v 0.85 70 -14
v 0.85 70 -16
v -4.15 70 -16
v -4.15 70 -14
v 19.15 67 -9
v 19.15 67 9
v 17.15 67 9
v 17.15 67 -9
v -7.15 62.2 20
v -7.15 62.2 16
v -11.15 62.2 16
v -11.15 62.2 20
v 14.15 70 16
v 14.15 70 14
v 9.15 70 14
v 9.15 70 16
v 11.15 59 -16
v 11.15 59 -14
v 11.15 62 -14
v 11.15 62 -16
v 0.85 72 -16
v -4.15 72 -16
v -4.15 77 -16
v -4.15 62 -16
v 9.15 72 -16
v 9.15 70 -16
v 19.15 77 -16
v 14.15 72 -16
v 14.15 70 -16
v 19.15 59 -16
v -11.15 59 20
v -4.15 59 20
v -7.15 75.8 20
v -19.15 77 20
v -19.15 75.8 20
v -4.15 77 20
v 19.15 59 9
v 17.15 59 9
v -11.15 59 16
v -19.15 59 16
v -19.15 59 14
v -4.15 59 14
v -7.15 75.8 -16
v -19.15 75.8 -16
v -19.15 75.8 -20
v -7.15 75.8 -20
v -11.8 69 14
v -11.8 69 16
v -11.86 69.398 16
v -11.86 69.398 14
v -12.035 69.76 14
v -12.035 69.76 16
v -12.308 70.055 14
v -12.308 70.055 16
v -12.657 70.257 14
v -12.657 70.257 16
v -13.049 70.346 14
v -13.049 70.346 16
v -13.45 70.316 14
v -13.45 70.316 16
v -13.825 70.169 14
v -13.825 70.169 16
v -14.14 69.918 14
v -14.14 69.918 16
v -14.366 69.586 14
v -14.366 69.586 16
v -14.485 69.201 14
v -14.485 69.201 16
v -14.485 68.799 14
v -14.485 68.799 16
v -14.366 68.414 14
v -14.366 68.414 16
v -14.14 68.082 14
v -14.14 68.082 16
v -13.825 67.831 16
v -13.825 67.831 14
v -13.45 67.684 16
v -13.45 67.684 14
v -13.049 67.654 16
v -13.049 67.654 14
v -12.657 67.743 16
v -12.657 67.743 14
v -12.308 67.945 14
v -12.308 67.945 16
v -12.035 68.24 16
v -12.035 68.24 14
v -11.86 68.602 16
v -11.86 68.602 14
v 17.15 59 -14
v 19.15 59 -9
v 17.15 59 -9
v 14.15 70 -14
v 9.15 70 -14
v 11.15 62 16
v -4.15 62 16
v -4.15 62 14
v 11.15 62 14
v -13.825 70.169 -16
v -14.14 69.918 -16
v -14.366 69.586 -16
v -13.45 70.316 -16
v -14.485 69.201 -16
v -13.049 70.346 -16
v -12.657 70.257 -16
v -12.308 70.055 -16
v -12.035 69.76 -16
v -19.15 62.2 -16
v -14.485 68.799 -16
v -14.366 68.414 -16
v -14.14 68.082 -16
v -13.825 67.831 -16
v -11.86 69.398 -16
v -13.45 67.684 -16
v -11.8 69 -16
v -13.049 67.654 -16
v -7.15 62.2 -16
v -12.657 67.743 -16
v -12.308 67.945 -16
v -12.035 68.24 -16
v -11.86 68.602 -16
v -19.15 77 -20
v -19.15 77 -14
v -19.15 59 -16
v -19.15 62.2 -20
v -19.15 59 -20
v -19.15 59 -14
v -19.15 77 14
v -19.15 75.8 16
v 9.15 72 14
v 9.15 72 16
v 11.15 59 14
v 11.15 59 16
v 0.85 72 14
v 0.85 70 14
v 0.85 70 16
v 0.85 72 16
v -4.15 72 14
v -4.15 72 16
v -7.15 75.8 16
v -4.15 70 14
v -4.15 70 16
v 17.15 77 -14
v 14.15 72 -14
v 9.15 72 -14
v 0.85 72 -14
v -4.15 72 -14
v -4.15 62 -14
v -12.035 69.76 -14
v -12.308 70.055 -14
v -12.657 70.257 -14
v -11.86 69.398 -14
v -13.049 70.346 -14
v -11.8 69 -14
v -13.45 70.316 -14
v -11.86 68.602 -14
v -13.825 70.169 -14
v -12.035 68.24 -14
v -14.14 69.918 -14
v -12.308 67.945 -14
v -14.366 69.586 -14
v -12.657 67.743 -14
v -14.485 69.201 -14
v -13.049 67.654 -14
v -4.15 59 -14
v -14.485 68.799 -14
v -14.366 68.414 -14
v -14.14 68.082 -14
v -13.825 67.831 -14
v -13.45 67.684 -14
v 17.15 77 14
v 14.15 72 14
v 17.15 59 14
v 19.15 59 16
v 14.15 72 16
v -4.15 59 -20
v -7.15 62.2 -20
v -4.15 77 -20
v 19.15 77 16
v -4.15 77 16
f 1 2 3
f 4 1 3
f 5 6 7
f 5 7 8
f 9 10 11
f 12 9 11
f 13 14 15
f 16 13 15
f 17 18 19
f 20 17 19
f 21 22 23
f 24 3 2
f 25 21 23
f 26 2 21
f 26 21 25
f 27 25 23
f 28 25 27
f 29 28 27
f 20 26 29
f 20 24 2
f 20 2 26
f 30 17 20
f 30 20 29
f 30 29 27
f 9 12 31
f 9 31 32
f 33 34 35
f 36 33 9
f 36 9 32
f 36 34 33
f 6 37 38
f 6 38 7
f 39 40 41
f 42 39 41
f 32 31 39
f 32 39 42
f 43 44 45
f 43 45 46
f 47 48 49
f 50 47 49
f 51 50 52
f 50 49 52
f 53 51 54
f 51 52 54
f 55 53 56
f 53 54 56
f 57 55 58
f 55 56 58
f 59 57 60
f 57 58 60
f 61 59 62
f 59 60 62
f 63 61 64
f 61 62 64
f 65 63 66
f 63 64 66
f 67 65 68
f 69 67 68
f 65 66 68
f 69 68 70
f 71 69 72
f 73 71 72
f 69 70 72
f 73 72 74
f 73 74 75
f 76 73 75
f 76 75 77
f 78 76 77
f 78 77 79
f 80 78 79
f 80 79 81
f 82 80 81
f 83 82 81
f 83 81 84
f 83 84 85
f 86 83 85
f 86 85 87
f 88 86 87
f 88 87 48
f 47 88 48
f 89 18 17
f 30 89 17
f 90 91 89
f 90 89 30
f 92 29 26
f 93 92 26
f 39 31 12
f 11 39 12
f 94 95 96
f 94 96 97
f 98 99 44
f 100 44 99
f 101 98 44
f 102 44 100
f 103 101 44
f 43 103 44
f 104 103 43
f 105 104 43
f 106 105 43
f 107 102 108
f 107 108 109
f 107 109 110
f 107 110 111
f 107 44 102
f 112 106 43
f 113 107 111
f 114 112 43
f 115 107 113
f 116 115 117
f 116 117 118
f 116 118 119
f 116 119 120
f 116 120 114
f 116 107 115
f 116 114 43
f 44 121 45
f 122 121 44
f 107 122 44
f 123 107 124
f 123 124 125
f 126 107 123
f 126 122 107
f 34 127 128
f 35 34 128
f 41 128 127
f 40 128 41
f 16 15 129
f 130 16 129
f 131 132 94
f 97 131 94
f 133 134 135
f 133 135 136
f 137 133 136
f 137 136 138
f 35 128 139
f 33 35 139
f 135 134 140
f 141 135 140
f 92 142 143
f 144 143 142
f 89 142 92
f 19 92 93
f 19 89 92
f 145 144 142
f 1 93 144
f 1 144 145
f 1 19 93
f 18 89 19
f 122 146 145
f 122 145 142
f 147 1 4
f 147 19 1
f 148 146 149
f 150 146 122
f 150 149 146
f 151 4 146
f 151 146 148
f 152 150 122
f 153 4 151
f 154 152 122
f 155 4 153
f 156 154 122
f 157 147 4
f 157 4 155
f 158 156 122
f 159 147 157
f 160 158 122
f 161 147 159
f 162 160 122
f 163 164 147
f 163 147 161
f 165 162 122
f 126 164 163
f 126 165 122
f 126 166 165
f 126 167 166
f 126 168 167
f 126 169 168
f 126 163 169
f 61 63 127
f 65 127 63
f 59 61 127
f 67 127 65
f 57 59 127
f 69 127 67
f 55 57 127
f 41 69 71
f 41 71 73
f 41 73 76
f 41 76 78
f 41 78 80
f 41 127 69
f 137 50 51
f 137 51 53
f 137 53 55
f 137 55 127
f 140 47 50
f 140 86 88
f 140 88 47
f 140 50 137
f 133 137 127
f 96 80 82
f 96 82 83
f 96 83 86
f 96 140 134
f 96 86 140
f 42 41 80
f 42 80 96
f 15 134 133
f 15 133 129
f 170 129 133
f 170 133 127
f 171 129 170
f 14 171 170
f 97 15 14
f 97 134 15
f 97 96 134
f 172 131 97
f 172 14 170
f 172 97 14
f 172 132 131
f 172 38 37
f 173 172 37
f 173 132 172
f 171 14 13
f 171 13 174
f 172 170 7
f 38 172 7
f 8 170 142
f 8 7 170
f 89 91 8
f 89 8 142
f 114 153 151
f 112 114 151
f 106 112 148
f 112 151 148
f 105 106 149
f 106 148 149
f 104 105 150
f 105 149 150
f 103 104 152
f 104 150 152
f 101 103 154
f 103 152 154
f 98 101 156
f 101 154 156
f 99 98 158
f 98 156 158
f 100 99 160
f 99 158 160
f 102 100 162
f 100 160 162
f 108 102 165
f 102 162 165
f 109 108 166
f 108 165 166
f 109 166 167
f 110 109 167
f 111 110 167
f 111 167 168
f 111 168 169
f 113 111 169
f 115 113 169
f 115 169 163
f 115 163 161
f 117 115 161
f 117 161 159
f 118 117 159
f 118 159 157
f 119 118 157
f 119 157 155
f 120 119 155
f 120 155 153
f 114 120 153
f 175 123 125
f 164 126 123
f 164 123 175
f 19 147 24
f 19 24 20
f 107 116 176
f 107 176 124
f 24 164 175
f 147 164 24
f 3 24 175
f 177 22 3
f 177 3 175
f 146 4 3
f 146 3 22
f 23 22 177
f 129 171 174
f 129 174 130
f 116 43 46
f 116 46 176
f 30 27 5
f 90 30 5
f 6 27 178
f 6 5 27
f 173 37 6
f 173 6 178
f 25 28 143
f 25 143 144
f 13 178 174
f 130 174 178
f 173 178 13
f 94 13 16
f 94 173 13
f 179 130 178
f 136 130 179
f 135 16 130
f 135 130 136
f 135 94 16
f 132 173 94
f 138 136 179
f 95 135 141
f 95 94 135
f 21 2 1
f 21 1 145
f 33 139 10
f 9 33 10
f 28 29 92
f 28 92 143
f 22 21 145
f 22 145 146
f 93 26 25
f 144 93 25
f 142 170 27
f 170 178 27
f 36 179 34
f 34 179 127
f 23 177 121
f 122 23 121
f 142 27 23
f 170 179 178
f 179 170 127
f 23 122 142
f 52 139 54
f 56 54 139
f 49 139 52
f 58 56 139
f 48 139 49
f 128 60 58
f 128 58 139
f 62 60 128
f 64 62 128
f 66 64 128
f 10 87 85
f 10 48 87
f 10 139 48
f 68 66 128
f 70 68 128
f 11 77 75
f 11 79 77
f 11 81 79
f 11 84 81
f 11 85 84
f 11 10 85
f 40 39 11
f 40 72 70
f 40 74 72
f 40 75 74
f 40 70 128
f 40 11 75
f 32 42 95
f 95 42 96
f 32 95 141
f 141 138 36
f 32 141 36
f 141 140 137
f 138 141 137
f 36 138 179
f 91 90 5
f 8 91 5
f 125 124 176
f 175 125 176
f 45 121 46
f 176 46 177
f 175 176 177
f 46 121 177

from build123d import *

# Parameters (mm, degrees)
SKETCH_1_W           = 38.3
SKETCH_1_H           = 32
EXTRUDE_1_DEPTH      = 2
EXTRUDE_2_DEPTH      = 75
SKETCH_9_R           = 1.35
CUT_EXTRUDE_5_DEPTH  = 33
SKETCH_10_W          = 15.3
SKETCH_10_H          = 52
CUT_EXTRUDE_6_DEPTH  = 33
SKETCH_11_W          = 28.3
SKETCH_11_H          = 22
CUT_EXTRUDE_7_DEPTH  = 78
SKETCH_13_W          = 18
SKETCH_13_H          = 57
CUT_EXTRUDE_8_DEPTH  = 39.3
SKETCH_14_W          = 5
SKETCH_14_H          = 2
CUT_EXTRUDE_9_DEPTH  = 33
EXTRUDE_3_DEPTH      = 4
EXTRUDE_4_DEPTH      = 4
SKETCH_19_W          = 8
SKETCH_19_H          = 45.4
CUT_EXTRUDE_10_DEPTH = 4
SKETCH_20_W          = 40.713744441
SKETCH_20_H          = 41.376466264
CUT_EXTRUDE_11_DEPTH = 59


with BuildPart() as part:
    # Эскиз1 → Бобышка-Вытянуть1 (new body)
    with BuildSketch(Plane(origin=(0, 0, 0), x_dir=(1, 0, 0), z_dir=(0, 1, 0))):
        Rectangle(SKETCH_1_W, SKETCH_1_H)
    extrude(amount=EXTRUDE_1_DEPTH)

    # Эскиз2 → Бобышка-Вытянуть2 (add)
    with BuildSketch(Plane(origin=(0, 2, 0), x_dir=(1, 0, 0), z_dir=(0, 1, 0))):
        Polygon((-19.15, 16), (19.15, 16), (19.15, -16), (-19.15, -16), (-19.15, -14), (17.15, -14), (17.15, 14), (-19.15, 14), align=None)
    extrude(amount=EXTRUDE_2_DEPTH)

    # Эскиз9 → Вырез-Вытянуть5 (cut, through all)
    with BuildSketch(Plane.XY.offset(16)):
        with Locations((-13.15, 69)):
            Circle(SKETCH_9_R)
        with Locations((-13.15, 10)):
            Circle(SKETCH_9_R)
    extrude(amount=-CUT_EXTRUDE_5_DEPTH, mode=Mode.SUBTRACT)

    # Эскиз10 → Вырез-Вытянуть6 (cut, through all)
    with BuildSketch(Plane.XY.offset(16)):
        with Locations((3.5, 36)):
            Rectangle(SKETCH_10_W, SKETCH_10_H)
    extrude(amount=-CUT_EXTRUDE_6_DEPTH, mode=Mode.SUBTRACT)

    # Эскиз11 → Вырез-Вытянуть7 (cut, through all)
    with BuildSketch(Plane.XZ):
        Rectangle(SKETCH_11_W, SKETCH_11_H)
    extrude(amount=-CUT_EXTRUDE_7_DEPTH, mode=Mode.SUBTRACT)

    # Эскиз13 → Вырез-Вытянуть8 (cut, through all)
    with BuildSketch(Plane(origin=(19.15, 0, 0), x_dir=(0, 0, -1), z_dir=(1, 0, 0))):
        with Locations((0, 38.5)):
            Rectangle(SKETCH_13_W, SKETCH_13_H)
    extrude(amount=-CUT_EXTRUDE_8_DEPTH, mode=Mode.SUBTRACT)

    # Эскиз14 → Вырез-Вытянуть9 (cut, through all)
    with BuildSketch(Plane(origin=(0, 0, -16), x_dir=(-1, 0, 0), z_dir=(0, 0, -1))):
        with Locations((-11.65, 71)):
            Rectangle(SKETCH_14_W, SKETCH_14_H)
        with Locations((1.65, 71)):
            Rectangle(SKETCH_14_W, SKETCH_14_H)
    extrude(amount=-CUT_EXTRUDE_9_DEPTH, mode=Mode.SUBTRACT)

    # Эскиз16 → Бобышка-Вытянуть3 (add)
    with BuildSketch(Plane.XY.offset(16)):
        Polygon((-19.15, 0), (-4.15, 0), (-4.15, 19.8), (-19.15, 19.8), (-19.15, 16.8), (-7.15, 16.8), (-7.15, 3.2), (-19.15, 3.2), align=None)
    extrude_3 = extrude(amount=EXTRUDE_3_DEPTH)

    # Зеркальное отражение1: Бобышка-Вытянуть3 across plane
    add(extrude_3.mirror(Plane.XY))

    # Эскиз18 → Бобышка-Вытянуть4 (add)
    with BuildSketch(Plane.XY.offset(16)):
        Polygon((-19.15, 62.2), (-19.15, 59), (-4.15, 59), (-4.15, 77), (-19.15, 77), (-19.15, 75.8), (-7.15, 75.8), (-7.15, 62.2), align=None)
    extrude_4 = extrude(amount=EXTRUDE_4_DEPTH)

    # Зеркальное отражение2: Бобышка-Вытянуть4 across plane
    add(extrude_4.mirror(Plane.XY))

    # Эскиз19 → Вырез-Вытянуть10 (cut)
    with BuildSketch(Plane.XY.offset(20)):
        with Locations((-15.15, 39.5)):
            Rectangle(SKETCH_19_W, SKETCH_19_H)
    extrude(amount=-CUT_EXTRUDE_10_DEPTH, mode=Mode.SUBTRACT)

    # Эскиз20 → Вырез-Вытянуть11 (cut)
    with BuildSketch(Plane.XZ):
        with Locations((1.20687222, -0.688233132)):
            Rectangle(SKETCH_20_W, SKETCH_20_H)
    extrude(amount=-CUT_EXTRUDE_11_DEPTH, mode=Mode.SUBTRACT)


solid = part.part
